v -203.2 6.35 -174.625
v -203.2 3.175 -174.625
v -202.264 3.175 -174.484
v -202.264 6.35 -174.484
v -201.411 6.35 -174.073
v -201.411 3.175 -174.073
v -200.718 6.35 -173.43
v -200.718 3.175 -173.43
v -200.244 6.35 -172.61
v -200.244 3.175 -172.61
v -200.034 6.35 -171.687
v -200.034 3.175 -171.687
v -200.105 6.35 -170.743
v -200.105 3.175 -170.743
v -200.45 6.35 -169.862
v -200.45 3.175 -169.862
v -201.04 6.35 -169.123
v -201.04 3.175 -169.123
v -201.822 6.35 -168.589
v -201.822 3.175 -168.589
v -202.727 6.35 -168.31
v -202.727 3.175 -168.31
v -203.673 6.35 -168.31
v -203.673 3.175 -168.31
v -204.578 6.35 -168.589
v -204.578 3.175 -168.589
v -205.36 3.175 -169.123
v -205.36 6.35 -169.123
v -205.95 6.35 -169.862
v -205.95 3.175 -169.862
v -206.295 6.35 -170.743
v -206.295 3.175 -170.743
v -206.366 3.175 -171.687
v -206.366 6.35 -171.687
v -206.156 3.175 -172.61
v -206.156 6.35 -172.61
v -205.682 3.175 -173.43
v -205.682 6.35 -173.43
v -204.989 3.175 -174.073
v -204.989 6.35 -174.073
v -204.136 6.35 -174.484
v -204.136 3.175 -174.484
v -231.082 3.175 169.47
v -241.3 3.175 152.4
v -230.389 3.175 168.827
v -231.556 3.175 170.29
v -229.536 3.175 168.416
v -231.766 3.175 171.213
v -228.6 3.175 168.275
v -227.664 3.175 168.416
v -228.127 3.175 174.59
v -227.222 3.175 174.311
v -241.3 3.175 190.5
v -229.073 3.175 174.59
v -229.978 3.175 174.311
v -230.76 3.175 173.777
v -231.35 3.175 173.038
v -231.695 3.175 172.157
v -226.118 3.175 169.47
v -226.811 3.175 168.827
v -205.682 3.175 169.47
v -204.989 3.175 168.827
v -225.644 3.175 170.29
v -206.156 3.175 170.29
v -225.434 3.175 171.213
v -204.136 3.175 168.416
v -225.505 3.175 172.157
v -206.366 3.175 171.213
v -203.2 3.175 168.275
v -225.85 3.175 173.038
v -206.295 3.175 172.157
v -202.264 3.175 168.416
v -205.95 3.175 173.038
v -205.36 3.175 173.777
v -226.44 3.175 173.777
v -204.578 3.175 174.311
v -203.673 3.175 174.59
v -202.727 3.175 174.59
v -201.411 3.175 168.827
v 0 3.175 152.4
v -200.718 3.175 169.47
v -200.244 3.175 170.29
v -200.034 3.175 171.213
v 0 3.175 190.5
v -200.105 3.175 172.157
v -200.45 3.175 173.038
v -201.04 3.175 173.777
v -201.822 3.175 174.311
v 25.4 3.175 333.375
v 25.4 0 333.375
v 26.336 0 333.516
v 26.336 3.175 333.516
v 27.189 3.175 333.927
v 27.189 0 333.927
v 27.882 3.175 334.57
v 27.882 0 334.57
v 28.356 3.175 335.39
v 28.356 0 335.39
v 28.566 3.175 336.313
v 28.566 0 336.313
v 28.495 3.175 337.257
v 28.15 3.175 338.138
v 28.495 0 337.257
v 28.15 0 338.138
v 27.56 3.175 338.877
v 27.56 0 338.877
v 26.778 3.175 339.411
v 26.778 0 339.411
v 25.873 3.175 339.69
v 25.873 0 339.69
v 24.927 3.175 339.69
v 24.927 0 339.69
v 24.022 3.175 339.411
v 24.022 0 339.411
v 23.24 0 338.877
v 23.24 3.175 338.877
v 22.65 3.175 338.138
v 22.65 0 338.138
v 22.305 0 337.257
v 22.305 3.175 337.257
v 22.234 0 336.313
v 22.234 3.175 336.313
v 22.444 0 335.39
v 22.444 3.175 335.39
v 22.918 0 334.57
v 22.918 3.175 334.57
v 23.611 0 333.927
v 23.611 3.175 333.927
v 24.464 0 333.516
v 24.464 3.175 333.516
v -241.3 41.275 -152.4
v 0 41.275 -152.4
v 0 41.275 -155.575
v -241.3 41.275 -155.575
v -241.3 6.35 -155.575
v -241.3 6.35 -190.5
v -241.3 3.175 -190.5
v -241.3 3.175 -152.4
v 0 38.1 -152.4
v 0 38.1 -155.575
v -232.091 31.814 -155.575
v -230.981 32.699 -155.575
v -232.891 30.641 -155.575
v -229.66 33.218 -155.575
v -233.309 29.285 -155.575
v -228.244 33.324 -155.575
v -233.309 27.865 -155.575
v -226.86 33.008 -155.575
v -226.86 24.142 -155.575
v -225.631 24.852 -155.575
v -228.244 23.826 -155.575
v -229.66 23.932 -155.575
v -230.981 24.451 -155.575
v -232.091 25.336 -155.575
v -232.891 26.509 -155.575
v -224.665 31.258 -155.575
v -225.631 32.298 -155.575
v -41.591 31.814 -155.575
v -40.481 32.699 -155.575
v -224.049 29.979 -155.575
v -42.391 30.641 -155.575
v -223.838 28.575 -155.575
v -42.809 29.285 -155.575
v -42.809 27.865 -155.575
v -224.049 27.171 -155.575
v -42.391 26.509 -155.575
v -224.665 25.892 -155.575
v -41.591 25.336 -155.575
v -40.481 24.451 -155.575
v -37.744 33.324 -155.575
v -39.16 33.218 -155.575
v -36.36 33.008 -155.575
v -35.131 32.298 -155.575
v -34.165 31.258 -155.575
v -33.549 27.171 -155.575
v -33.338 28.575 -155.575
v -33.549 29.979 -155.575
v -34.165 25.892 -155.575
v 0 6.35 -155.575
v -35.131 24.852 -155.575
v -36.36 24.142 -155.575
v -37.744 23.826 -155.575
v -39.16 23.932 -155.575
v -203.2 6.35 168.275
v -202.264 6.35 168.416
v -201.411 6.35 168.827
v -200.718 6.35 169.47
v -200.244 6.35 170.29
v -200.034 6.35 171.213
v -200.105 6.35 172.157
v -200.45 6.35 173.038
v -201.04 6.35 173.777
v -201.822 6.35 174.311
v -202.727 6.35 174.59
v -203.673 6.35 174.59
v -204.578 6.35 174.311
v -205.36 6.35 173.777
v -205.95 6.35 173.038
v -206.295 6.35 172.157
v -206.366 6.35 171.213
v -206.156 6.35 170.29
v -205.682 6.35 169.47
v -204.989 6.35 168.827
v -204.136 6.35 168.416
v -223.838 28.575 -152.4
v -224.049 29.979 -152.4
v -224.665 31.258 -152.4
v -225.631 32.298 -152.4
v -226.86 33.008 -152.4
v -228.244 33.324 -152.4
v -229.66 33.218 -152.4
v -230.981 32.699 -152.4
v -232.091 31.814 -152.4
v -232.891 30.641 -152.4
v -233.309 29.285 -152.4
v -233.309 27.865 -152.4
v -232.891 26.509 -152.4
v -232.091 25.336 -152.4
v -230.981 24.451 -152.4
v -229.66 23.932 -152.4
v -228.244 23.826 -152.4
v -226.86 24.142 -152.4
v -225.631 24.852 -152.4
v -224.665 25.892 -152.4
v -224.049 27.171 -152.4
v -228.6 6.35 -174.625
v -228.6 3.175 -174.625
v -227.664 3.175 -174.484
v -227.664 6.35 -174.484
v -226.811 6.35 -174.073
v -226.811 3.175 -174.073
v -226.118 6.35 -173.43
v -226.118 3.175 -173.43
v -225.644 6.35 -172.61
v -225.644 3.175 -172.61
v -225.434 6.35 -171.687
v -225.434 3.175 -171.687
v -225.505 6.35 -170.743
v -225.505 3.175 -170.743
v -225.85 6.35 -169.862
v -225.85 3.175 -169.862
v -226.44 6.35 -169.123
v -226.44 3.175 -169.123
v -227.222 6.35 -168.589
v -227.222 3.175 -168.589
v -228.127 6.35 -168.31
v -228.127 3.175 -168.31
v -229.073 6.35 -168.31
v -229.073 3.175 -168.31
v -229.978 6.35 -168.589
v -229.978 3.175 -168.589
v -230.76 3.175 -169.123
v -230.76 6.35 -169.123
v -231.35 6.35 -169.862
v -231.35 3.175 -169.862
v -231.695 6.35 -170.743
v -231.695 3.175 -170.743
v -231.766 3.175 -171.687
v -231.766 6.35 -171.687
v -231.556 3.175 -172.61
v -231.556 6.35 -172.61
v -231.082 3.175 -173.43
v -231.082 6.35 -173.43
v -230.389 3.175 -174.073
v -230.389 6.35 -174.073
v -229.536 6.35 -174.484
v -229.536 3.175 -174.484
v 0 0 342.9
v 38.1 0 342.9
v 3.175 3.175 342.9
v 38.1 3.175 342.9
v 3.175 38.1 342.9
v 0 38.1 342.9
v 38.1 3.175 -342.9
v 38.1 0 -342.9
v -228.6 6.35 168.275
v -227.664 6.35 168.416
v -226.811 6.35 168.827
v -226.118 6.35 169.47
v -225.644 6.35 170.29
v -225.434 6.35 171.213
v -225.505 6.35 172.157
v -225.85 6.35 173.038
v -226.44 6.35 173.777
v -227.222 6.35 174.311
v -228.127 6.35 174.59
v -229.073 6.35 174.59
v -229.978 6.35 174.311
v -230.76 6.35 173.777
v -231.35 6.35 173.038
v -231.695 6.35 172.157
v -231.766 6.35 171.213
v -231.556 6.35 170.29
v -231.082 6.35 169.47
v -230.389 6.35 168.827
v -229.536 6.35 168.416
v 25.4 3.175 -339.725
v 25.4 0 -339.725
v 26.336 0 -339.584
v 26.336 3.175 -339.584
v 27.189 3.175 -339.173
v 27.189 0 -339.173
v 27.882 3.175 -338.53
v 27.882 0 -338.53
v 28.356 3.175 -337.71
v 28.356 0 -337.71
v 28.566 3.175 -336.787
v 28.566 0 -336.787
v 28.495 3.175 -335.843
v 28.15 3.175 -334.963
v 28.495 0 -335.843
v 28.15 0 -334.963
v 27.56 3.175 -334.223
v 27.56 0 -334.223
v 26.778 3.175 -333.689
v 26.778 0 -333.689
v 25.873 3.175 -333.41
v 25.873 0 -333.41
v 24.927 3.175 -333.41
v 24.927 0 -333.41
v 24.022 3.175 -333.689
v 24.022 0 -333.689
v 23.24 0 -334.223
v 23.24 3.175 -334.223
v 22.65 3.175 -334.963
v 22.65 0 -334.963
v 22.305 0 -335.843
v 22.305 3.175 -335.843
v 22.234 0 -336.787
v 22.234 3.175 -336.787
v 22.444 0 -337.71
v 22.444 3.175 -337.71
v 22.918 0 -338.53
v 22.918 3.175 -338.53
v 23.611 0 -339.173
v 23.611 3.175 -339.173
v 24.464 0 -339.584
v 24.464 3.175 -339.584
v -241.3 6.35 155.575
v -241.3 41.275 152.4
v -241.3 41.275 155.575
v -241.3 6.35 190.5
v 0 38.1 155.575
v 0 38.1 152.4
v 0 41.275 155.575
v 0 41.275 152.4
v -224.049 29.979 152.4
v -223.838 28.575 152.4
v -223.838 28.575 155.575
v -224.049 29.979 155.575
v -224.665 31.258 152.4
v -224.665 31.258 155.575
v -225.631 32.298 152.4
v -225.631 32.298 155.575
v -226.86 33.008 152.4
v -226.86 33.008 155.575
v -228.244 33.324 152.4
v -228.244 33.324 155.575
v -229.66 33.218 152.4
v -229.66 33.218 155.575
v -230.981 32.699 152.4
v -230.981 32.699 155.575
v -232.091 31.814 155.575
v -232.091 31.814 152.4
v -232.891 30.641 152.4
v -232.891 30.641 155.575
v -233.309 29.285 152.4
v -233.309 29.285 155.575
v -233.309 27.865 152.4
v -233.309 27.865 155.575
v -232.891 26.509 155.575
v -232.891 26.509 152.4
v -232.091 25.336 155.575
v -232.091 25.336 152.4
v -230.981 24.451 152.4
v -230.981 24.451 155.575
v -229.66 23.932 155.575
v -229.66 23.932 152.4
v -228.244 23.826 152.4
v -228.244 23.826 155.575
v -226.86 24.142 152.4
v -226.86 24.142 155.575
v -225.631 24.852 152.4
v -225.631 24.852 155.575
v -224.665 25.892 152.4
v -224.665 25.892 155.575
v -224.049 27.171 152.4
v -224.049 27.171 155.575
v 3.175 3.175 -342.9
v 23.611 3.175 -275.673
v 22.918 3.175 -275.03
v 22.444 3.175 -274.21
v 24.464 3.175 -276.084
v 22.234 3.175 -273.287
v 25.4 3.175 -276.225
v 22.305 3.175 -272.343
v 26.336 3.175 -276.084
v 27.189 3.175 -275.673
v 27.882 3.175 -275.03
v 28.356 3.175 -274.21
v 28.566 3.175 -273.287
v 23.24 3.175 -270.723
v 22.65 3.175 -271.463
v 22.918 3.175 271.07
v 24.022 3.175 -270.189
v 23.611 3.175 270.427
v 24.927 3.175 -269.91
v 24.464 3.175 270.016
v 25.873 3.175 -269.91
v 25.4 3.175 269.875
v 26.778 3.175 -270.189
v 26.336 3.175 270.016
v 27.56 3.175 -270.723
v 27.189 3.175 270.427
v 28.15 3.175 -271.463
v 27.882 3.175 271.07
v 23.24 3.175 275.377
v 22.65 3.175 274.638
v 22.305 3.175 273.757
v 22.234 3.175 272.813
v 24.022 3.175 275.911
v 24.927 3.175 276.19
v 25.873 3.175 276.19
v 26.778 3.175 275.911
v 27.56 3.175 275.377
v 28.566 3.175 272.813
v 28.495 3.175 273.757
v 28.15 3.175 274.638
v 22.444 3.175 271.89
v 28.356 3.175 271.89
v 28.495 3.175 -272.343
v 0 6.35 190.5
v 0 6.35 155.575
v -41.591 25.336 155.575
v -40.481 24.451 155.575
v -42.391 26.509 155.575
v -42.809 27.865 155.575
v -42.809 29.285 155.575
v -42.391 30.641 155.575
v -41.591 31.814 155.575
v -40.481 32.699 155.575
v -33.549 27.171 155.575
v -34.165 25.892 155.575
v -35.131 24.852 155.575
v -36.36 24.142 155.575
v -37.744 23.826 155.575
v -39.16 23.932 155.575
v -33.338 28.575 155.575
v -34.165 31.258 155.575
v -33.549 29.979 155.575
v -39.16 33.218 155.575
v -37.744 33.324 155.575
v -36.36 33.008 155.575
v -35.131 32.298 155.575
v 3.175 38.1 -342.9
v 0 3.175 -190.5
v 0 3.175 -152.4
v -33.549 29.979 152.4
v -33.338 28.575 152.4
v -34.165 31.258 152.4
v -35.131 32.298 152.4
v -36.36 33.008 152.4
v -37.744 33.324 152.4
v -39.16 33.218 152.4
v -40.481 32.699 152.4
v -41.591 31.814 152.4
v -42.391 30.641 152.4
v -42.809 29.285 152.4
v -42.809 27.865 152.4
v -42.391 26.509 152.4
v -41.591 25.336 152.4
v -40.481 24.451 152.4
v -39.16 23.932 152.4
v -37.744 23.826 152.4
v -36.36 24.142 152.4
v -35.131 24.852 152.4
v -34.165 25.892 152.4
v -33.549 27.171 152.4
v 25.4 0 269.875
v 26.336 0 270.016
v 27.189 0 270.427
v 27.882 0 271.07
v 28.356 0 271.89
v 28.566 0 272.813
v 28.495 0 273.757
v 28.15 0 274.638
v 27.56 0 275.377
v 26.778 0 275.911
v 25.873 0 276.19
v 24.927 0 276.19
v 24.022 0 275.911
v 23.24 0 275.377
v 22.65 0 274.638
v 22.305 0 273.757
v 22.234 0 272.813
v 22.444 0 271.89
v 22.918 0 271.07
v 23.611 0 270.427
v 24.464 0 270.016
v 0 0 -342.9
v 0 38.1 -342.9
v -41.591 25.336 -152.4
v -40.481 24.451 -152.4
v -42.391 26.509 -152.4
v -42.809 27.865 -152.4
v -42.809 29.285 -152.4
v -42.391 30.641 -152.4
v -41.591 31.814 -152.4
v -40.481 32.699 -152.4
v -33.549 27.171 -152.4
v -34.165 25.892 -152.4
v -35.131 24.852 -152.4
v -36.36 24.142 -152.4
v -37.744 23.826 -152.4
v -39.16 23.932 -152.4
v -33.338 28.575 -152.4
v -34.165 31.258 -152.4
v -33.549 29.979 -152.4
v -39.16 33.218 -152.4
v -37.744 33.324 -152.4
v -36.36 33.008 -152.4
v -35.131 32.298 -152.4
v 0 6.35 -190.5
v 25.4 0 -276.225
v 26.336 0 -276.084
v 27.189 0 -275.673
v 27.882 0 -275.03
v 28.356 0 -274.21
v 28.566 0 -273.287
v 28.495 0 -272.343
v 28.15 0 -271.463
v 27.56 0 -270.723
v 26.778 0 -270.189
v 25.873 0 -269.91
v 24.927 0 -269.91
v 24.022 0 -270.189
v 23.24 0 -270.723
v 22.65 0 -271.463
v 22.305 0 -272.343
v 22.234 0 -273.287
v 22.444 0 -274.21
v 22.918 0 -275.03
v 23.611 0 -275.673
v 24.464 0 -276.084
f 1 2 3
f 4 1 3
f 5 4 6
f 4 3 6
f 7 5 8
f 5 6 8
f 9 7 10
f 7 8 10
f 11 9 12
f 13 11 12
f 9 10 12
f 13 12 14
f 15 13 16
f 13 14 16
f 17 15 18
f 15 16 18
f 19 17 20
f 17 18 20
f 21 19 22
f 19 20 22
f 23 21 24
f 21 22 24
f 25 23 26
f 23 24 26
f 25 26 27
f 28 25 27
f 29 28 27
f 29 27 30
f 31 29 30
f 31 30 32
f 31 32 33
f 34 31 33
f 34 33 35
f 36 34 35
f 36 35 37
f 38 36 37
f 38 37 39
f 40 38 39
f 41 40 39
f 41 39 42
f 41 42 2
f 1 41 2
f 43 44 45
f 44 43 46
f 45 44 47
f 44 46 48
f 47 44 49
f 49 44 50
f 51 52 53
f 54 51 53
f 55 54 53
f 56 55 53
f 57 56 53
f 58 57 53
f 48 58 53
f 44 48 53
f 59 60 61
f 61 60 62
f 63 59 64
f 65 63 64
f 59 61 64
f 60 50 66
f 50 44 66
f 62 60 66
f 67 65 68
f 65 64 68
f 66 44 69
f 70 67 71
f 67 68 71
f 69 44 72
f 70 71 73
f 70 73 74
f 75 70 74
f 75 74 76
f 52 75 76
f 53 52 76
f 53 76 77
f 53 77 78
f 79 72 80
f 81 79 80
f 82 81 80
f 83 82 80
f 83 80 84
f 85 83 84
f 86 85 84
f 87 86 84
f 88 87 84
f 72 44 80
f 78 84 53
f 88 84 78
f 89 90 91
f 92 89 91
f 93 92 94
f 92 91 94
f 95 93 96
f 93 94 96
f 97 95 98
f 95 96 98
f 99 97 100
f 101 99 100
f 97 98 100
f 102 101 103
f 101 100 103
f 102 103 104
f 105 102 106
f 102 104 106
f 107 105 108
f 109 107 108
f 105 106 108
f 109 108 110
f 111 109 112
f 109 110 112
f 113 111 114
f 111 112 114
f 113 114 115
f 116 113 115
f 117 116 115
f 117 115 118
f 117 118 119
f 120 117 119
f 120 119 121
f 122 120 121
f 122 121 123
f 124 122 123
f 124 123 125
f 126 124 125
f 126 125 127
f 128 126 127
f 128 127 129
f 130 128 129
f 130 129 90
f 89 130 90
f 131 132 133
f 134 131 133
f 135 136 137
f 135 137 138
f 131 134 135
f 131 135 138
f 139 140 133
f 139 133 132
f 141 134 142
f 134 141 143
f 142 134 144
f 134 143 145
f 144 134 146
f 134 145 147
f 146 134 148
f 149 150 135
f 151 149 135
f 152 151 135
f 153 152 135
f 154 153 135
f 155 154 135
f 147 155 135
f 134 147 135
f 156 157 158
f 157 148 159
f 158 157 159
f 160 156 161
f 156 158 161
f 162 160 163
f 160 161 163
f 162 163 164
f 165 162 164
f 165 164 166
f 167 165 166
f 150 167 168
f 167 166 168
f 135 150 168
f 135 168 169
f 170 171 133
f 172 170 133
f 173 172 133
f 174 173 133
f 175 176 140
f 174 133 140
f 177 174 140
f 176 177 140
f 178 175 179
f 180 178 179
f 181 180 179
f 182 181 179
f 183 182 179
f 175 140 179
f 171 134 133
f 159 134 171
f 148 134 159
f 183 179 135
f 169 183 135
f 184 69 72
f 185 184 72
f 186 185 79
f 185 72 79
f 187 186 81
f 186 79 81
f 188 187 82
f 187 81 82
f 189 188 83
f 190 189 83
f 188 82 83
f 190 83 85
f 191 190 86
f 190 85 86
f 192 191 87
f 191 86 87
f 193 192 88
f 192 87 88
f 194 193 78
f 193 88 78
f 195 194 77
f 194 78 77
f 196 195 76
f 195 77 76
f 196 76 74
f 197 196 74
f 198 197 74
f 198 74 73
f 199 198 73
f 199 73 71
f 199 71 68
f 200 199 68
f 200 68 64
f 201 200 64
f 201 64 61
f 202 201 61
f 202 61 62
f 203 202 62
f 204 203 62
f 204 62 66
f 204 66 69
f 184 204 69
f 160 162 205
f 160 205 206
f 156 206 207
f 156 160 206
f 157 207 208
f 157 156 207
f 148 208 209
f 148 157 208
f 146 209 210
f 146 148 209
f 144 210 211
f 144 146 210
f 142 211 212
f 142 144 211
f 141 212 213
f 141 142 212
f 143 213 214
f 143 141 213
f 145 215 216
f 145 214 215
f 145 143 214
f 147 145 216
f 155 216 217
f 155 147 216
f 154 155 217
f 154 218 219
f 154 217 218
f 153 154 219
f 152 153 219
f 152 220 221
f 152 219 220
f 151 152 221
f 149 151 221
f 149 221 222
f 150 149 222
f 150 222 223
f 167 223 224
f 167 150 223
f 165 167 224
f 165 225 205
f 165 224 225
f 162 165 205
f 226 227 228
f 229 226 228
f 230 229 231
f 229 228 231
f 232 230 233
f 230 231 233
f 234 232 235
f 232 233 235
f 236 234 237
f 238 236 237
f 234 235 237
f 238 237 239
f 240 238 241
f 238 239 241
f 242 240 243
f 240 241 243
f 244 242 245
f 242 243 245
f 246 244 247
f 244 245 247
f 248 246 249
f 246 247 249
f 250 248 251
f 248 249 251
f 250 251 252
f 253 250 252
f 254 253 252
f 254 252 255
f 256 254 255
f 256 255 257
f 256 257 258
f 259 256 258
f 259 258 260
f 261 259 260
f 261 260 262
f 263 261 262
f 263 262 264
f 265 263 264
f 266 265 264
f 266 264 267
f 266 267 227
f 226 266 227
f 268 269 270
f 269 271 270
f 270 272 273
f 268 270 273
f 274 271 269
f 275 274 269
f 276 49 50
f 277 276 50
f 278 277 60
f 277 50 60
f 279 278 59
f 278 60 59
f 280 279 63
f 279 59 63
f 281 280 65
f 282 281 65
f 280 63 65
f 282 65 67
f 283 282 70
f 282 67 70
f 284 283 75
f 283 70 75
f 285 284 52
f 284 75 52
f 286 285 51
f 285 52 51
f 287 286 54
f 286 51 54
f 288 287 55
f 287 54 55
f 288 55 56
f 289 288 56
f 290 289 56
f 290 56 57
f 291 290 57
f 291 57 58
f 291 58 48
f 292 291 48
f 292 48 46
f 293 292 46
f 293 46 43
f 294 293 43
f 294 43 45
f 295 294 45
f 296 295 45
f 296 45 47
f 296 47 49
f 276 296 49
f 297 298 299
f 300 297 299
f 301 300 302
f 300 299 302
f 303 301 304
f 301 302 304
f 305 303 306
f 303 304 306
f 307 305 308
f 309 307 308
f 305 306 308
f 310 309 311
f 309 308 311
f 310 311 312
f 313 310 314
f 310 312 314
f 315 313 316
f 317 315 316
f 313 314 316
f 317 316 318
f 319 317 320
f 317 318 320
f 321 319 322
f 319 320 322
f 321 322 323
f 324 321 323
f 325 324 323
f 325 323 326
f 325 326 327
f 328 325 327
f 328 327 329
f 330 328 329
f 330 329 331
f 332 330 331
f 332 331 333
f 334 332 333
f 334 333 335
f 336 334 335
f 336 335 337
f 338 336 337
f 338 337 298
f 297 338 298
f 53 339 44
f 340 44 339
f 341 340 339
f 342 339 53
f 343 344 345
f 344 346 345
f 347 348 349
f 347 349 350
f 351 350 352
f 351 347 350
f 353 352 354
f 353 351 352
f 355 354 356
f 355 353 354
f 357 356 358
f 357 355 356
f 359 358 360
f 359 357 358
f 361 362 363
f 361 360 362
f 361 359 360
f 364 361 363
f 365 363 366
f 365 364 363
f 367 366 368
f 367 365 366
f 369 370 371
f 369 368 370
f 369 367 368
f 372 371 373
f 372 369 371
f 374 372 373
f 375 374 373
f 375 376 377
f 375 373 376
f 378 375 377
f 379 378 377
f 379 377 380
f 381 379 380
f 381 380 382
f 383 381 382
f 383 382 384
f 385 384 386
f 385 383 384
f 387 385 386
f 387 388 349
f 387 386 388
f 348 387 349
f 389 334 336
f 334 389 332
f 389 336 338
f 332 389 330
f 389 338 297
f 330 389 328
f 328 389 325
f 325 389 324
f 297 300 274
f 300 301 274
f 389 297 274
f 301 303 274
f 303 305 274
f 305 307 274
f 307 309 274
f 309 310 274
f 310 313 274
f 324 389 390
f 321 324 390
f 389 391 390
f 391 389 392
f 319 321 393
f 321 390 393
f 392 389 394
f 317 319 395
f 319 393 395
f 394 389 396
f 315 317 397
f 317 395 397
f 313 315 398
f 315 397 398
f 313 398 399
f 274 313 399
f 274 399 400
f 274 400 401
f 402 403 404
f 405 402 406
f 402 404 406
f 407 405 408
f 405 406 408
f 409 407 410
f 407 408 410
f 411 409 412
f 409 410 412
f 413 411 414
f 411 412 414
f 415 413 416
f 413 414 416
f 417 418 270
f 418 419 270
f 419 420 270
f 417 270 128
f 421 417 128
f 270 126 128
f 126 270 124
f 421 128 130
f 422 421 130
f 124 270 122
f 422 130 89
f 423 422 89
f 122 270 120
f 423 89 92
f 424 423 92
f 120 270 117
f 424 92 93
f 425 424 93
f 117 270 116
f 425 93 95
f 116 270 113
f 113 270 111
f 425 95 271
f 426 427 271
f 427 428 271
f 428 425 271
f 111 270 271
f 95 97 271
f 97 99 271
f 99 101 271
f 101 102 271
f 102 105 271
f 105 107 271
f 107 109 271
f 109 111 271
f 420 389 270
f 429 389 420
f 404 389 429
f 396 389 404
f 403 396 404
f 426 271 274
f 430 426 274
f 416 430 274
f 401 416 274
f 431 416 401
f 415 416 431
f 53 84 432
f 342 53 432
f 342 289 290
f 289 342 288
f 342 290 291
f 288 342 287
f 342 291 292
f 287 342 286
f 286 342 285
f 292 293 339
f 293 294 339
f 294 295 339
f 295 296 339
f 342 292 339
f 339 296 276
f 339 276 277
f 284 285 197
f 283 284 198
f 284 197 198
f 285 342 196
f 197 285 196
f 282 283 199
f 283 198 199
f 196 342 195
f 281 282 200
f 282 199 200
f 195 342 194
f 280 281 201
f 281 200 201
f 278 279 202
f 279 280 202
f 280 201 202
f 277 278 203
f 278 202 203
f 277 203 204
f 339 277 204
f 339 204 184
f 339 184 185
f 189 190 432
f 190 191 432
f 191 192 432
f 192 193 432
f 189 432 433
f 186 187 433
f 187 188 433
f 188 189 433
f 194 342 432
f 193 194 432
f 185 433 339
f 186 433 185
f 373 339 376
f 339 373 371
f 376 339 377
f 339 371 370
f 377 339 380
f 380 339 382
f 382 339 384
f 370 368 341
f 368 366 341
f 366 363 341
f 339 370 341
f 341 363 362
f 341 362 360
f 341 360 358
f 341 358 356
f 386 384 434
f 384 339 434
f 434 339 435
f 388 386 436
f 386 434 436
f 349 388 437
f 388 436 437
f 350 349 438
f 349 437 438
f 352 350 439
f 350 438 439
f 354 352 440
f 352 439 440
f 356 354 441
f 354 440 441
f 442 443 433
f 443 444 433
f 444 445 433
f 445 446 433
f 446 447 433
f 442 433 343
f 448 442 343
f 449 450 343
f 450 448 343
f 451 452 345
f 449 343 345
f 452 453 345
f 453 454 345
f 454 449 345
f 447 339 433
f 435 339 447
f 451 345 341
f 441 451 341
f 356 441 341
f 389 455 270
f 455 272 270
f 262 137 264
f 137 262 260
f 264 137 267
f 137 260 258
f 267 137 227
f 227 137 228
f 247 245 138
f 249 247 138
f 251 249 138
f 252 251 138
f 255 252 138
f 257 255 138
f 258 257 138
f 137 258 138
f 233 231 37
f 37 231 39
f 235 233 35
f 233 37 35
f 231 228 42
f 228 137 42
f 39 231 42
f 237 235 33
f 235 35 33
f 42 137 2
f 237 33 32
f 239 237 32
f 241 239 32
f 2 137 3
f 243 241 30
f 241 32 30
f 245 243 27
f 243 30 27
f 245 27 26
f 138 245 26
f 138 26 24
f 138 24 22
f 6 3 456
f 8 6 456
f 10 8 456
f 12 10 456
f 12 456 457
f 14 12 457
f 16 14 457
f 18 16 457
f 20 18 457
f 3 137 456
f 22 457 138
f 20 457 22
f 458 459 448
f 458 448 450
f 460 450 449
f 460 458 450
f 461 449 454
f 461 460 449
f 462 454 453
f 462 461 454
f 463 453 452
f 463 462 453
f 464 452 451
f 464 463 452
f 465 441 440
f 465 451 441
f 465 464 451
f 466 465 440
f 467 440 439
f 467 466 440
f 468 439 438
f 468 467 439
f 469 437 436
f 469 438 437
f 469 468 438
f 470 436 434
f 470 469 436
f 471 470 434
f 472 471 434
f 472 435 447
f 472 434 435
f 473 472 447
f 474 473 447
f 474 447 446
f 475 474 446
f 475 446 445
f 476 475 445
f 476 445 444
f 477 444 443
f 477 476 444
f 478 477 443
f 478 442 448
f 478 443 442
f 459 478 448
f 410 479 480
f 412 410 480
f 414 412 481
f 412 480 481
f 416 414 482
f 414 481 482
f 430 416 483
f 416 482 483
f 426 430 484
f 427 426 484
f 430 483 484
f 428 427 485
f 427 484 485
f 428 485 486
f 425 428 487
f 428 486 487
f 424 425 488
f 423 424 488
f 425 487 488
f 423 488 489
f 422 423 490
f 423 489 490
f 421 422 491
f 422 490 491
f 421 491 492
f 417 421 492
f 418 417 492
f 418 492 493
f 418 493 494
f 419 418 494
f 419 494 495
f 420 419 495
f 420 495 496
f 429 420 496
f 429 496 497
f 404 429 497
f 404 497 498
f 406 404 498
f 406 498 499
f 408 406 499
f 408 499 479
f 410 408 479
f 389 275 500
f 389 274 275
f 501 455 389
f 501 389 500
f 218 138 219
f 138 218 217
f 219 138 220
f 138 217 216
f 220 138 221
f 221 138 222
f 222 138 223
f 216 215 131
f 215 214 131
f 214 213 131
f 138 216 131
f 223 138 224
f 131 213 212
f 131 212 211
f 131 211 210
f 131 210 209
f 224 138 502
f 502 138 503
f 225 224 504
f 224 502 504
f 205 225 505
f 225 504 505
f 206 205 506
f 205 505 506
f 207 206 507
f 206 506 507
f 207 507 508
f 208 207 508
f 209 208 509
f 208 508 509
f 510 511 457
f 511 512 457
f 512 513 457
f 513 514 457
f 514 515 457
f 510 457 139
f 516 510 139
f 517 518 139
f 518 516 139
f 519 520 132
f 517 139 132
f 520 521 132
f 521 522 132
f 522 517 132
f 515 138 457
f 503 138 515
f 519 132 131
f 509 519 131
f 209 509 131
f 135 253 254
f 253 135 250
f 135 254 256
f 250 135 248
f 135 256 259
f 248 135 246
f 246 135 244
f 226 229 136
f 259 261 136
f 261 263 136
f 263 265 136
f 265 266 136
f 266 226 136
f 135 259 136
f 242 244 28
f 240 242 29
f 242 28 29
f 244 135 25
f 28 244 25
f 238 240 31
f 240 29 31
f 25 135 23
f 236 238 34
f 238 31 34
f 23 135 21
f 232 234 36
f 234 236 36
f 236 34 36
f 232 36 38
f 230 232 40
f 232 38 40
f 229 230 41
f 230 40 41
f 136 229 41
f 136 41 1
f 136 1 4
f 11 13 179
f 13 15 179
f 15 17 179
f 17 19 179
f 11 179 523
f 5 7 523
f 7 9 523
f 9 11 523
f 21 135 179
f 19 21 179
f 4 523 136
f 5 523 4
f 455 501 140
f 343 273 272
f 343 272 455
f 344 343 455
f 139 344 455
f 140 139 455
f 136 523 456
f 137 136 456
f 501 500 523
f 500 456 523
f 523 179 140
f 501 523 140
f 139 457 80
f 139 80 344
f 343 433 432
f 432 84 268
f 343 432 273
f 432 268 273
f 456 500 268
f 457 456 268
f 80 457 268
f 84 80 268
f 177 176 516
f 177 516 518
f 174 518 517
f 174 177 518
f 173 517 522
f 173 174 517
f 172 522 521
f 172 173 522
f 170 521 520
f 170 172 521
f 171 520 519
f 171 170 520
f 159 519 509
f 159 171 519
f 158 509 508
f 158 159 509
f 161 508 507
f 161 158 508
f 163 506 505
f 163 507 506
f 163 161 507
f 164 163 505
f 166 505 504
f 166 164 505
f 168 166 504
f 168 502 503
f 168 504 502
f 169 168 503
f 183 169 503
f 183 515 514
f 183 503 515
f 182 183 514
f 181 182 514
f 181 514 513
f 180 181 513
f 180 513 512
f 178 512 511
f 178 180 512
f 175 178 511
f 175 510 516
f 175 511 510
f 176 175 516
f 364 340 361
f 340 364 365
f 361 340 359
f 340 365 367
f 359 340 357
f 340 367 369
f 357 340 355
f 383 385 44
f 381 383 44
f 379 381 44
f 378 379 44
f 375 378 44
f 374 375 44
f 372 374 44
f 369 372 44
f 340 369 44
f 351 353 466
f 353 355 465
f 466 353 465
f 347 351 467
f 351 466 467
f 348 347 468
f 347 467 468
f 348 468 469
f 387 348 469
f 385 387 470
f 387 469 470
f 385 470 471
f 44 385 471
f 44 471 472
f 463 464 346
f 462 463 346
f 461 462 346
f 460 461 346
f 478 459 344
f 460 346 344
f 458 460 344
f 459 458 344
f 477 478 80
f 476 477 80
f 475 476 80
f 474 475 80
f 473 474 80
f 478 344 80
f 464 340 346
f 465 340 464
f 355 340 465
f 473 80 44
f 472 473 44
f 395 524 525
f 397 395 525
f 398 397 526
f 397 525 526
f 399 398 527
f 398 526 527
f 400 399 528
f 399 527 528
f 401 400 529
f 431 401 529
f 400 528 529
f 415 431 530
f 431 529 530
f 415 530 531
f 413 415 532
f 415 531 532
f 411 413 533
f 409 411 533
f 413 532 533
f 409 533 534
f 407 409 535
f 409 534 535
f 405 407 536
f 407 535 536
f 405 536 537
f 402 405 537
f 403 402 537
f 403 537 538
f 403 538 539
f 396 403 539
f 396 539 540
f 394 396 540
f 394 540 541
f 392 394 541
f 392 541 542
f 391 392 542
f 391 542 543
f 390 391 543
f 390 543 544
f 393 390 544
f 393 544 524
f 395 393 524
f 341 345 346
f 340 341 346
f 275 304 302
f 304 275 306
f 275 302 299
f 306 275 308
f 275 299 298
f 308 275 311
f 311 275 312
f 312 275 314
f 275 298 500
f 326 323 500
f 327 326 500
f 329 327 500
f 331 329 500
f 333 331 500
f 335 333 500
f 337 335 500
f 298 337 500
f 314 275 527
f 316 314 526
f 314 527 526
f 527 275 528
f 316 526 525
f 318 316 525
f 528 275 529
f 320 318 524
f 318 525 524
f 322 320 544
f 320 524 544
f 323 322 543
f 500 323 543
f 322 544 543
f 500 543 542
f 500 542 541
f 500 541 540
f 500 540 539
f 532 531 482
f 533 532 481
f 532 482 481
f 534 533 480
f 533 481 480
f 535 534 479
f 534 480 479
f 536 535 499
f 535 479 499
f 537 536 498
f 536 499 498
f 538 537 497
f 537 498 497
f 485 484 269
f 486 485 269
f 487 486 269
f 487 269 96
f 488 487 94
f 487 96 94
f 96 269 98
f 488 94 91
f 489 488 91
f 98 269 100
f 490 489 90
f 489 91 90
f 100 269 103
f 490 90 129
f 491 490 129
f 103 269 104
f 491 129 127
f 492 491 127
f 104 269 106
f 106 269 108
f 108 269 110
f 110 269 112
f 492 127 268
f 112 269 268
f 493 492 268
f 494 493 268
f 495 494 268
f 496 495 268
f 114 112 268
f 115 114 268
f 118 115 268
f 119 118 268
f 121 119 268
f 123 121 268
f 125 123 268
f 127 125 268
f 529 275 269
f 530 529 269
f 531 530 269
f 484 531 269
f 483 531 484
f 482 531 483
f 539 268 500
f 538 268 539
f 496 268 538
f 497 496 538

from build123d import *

# Parameters (mm, degrees)
EXTRUDE_THIN1_DEPTH     = 342.9
EXTRUDE_THIN2_DEPTH     = 241.3
CUT_EXTRUDE1_REACH      = 423.02
SKETCH3_R               = 3.175
CUT_EXTRUDE2_REACH      = 423.319
SKETCH4_R               = 3.175
CUT_EXTRUDE3_DEPTH      = 422.319030694
CUT_EXTRUDE3_DEPTH_BACK = 422.319030694
SKETCH5_R               = 4.7625


with BuildPart() as part:
    # Sketch1 → Extrude-Thin1 (new, symmetric)
    with BuildSketch(Plane.XY):
        Polygon((38.1, 0), (0, 0), (0, 38.1), (3.175, 38.1), (3.175, 3.175), (38.1, 3.175), align=None)
    extrude(amount=EXTRUDE_THIN1_DEPTH, both=True)

    # Sketch2 → Extrude-Thin2 (add)
    with BuildSketch(Plane.ZY):
        Polygon((-190.5, 3.175), (-152.4, 3.175), (-152.4, 41.275), (-155.575, 41.275), (-155.575, 6.35), (-190.5, 6.35), align=None)
        Polygon((190.5, 3.175), (152.4, 3.175), (152.4, 41.275), (155.575, 41.275), (155.575, 6.35), (190.5, 6.35), align=None)
    extrude(amount=EXTRUDE_THIN2_DEPTH)

    # Sketch3 → Cut-Extrude1 (cut, up to next)
    with BuildSketch(Plane.XZ.offset(-3.175), mode=Mode.PRIVATE) as cut_extrude1_sk1:
        with Locations((-228.6, 171.45)):
            Circle(SKETCH3_R)
    cut_extrude1_tool1 = extrude(cut_extrude1_sk1.sketch, amount=-CUT_EXTRUDE1_REACH, mode=Mode.PRIVATE) & part.part
    # Sketch3 → Cut-Extrude1 (cut, up to next)
    with BuildSketch(Plane.XZ.offset(-3.175), mode=Mode.PRIVATE) as cut_extrude1_sk2:
        with Locations((-203.2, 171.45)):
            Circle(SKETCH3_R)
    cut_extrude1_tool2 = extrude(cut_extrude1_sk2.sketch, amount=-CUT_EXTRUDE1_REACH, mode=Mode.PRIVATE) & part.part
    # Sketch3 → Cut-Extrude1 (cut, up to next)
    with BuildSketch(Plane.XZ.offset(-3.175), mode=Mode.PRIVATE) as cut_extrude1_sk3:
        with Locations((-228.6, -171.45)):
            Circle(SKETCH3_R)
    cut_extrude1_tool3 = extrude(cut_extrude1_sk3.sketch, amount=-CUT_EXTRUDE1_REACH, mode=Mode.PRIVATE) & part.part
    # Sketch3 → Cut-Extrude1 (cut, up to next)
    with BuildSketch(Plane.XZ.offset(-3.175), mode=Mode.PRIVATE) as cut_extrude1_sk4:
        with Locations((-203.2, -171.45)):
            Circle(SKETCH3_R)
    cut_extrude1_tool4 = extrude(cut_extrude1_sk4.sketch, amount=-CUT_EXTRUDE1_REACH, mode=Mode.PRIVATE) & part.part
    add(cut_extrude1_tool1.solids().sort_by_distance((-228.6, 3.175, 171.45))[0], mode=Mode.SUBTRACT)
    add(cut_extrude1_tool2.solids().sort_by_distance((-203.2, 3.175, 171.45))[0], mode=Mode.SUBTRACT)
    add(cut_extrude1_tool3.solids().sort_by_distance((-228.6, 3.175, -171.45))[0], mode=Mode.SUBTRACT)
    add(cut_extrude1_tool4.solids().sort_by_distance((-203.2, 3.175, -171.45))[0], mode=Mode.SUBTRACT)

    # Sketch4 → Cut-Extrude2 (cut, up to next)
    with BuildSketch(Plane.XZ, mode=Mode.PRIVATE) as cut_extrude2_sk1:
        with Locations((25.4, -336.55)):
            Circle(SKETCH4_R)
    cut_extrude2_tool1 = extrude(cut_extrude2_sk1.sketch, amount=-CUT_EXTRUDE2_REACH, mode=Mode.PRIVATE) & part.part
    # Sketch4 → Cut-Extrude2 (cut, up to next)
    with BuildSketch(Plane.XZ, mode=Mode.PRIVATE) as cut_extrude2_sk2:
        with Locations((25.4, -273.05)):
            Circle(SKETCH4_R)
    cut_extrude2_tool2 = extrude(cut_extrude2_sk2.sketch, amount=-CUT_EXTRUDE2_REACH, mode=Mode.PRIVATE) & part.part
    # Sketch4 → Cut-Extrude2 (cut, up to next)
    with BuildSketch(Plane.XZ, mode=Mode.PRIVATE) as cut_extrude2_sk3:
        with Locations((25.4, 273.05)):
            Circle(SKETCH4_R)
    cut_extrude2_tool3 = extrude(cut_extrude2_sk3.sketch, amount=-CUT_EXTRUDE2_REACH, mode=Mode.PRIVATE) & part.part
    # Sketch4 → Cut-Extrude2 (cut, up to next)
    with BuildSketch(Plane.XZ, mode=Mode.PRIVATE) as cut_extrude2_sk4:
        with Locations((25.4, 336.55)):
            Circle(SKETCH4_R)
    cut_extrude2_tool4 = extrude(cut_extrude2_sk4.sketch, amount=-CUT_EXTRUDE2_REACH, mode=Mode.PRIVATE) & part.part
    add(cut_extrude2_tool1.solids().sort_by_distance((25.4, 0, -336.55))[0], mode=Mode.SUBTRACT)
    add(cut_extrude2_tool2.solids().sort_by_distance((25.4, 0, -273.05))[0], mode=Mode.SUBTRACT)
    add(cut_extrude2_tool3.solids().sort_by_distance((25.4, 0, 273.05))[0], mode=Mode.SUBTRACT)
    add(cut_extrude2_tool4.solids().sort_by_distance((25.4, 0, 336.55))[0], mode=Mode.SUBTRACT)

    # Sketch5 → Cut-Extrude3 (cut, two sides: drawn at the far end of the back side and taken through both)
    with BuildSketch(Plane.XY.offset(-CUT_EXTRUDE3_DEPTH_BACK)):
        with Locations((-228.6, 28.575)):
            Circle(SKETCH5_R)
        with Locations((-38.1, 28.575)):
            Circle(SKETCH5_R)
    extrude(amount=CUT_EXTRUDE3_DEPTH + CUT_EXTRUDE3_DEPTH_BACK, mode=Mode.SUBTRACT)


solid = part.part
